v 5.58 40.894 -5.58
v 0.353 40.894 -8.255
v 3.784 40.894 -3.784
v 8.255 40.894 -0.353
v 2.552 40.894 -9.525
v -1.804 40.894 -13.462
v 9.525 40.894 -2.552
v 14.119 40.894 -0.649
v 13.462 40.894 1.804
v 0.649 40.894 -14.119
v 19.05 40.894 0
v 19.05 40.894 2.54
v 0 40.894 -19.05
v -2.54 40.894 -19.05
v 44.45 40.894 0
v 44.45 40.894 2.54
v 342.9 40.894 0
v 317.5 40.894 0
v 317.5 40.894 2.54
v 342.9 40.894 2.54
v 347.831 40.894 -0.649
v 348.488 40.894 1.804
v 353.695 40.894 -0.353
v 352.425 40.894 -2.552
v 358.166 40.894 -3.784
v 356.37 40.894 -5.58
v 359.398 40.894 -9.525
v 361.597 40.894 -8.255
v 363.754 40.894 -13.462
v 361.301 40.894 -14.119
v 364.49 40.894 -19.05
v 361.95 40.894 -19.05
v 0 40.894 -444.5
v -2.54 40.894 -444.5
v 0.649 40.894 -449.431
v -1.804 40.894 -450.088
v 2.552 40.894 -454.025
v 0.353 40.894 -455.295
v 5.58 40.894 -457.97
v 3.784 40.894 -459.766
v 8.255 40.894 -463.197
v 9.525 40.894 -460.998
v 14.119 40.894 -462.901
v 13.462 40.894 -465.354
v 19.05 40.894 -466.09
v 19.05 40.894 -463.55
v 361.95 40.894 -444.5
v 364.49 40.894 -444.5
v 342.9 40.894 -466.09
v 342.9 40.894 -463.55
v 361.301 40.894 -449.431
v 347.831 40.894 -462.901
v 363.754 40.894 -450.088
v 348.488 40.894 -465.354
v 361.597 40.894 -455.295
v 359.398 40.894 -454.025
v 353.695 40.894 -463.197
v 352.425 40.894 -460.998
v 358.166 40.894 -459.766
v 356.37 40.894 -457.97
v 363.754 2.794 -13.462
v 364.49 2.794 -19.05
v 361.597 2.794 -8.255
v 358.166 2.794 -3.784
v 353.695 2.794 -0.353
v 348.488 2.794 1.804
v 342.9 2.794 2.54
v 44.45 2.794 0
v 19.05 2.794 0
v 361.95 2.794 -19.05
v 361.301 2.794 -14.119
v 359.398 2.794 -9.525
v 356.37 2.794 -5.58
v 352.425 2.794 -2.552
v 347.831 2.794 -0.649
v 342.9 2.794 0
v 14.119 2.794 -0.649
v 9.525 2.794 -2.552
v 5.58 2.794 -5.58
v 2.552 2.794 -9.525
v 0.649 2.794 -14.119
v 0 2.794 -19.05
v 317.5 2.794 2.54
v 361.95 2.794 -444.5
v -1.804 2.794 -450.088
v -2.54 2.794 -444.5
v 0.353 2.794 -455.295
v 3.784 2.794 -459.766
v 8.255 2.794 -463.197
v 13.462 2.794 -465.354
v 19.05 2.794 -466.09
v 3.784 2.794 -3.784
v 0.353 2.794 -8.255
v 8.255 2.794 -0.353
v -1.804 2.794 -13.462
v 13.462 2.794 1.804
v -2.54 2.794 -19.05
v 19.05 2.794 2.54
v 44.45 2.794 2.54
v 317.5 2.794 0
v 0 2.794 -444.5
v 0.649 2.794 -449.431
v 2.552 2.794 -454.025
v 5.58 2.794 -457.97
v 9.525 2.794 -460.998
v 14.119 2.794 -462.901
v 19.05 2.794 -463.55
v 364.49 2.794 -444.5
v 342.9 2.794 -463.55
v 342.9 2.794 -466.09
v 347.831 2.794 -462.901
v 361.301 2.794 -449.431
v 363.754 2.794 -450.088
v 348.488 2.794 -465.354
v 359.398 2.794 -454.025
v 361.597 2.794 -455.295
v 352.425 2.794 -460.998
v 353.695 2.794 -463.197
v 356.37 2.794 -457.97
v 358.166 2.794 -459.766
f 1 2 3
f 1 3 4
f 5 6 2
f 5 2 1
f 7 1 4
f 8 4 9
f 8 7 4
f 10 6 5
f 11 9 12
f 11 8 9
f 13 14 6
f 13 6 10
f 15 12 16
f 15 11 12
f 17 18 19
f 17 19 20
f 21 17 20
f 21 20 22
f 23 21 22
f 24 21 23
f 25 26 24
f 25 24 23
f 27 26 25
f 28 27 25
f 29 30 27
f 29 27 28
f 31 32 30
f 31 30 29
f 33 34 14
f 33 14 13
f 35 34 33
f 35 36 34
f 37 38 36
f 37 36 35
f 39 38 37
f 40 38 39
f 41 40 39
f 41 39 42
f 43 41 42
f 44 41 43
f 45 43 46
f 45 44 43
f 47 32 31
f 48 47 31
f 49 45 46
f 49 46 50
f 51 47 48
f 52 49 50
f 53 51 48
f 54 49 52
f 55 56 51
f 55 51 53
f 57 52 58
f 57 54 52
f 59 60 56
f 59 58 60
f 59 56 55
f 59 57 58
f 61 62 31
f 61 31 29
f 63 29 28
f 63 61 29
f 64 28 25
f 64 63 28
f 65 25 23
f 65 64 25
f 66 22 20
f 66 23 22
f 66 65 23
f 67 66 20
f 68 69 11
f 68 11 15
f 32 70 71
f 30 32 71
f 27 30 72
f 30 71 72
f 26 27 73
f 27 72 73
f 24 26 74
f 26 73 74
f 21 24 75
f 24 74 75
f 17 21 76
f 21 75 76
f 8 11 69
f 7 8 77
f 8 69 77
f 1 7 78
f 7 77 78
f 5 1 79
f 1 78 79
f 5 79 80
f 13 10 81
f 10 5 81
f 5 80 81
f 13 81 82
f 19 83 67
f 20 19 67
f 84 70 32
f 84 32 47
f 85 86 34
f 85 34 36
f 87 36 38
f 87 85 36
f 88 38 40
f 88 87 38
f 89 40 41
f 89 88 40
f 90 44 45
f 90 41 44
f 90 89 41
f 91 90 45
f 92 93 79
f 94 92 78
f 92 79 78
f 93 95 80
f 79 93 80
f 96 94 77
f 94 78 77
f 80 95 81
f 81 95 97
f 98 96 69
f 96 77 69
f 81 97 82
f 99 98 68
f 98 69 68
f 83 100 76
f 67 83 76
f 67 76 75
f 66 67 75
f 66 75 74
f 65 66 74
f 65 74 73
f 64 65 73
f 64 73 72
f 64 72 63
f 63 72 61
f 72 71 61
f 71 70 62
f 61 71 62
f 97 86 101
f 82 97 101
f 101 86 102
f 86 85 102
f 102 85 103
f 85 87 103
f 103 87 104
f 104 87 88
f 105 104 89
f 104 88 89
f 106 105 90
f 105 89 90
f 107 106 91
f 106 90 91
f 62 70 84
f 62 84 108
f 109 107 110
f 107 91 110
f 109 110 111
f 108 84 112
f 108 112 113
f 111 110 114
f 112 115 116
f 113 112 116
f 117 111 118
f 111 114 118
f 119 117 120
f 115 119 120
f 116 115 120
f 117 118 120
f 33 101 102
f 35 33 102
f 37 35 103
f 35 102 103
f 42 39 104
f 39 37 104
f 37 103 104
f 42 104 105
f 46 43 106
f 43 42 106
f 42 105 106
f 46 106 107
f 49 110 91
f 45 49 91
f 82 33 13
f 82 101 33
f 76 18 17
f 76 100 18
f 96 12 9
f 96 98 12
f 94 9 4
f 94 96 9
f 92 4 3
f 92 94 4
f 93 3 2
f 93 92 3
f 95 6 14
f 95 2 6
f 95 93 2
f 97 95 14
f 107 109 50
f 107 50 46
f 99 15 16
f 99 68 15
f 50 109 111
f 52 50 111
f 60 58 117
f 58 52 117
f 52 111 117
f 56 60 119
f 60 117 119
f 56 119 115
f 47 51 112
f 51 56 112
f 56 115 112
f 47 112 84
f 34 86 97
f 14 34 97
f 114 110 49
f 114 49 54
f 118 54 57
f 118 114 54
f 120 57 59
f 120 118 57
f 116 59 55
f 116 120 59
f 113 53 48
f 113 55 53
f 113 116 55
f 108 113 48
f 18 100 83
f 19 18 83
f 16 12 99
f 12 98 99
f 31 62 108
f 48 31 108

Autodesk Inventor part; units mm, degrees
ref_plane "YZ Plane" through (0, 0, 0) normal (1, 0, 0) x (0, 1, 0)
ref_plane "XZ Plane" through (0, 0, 0) normal (0, 1, 0) x (-1, 0, 0)
ref_plane "XY Plane" through (0, 0, 0) normal (0, 0, 1) x (1, 0, 0)
sketch "Sketch1" plane through (0, 0, 0) normal (0, 1, 0) x (-1, 0, 0)
  line L0 (0, 0) -> (-361.95, 0)
  line L1 (-361.95, 0) -> (-361.95, -463.55)
  line L2 (-361.95, -463.55) -> (0, -463.55)
  line L3 (0, -463.55) -> (0, 0)
  dimension "d0" = 361.95
  dimension "d1" = 463.55
extrude "Extrusion1" add sketch "Sketch1" along normal blind 2.794
fillet "Fillet1" radius 19.05 4 edges at (361.95, 1.397, 0) (361.95, 1.397, -463.55) (0, 1.397, -463.55) (0, 1.397, 0)
sketch "Sketch2" plane through (0, 0, 0) normal (0, -1, 0) x (1, 0, 0)
  line L0 (19.05, 0) -> (342.9, 0)
  line L1 (342.9, 0) -> (342.9, -2.8525)
  line L2 (342.9, -2.8525) -> (19.05, -2.8525)
  line L3 (19.05, -2.8525) -> (19.05, 0)
  line L4 (342.9, -2.8525) -> (317.5, -2.8525)
  line L5 (317.5, -2.8525) -> (317.5, 0)
  line L6 (317.5, 0) -> (342.9, 0)
  line L7 (342.9, 0) -> (342.9, -2.8525)
  line L8 (19.05, -2.8525) -> (44.45, -2.8525)
  line L9 (44.45, -2.8525) -> (44.45, 0)
  line L10 (44.45, 0) -> (19.05, 0)
  line L11 (19.05, 0) -> (19.05, -2.8525)
  line L12 (44.45, -2.8525) -> (317.5, -2.8525)
  line L13 (317.5, -2.8525) -> (317.5, 0)
  line L14 (317.5, 0) -> (44.45, 0)
  line L15 (44.45, 0) -> (44.45, -2.8525)
  point P0 (0, 0)
  dimension "d5" = 25.4
  dimension "d6" = 25.4
extrude "Extrusion2" add sketch "Sketch2" along normal blind 25.4 contours L0 L5 L2 L9
sketch "Sketch3" plane through (19.05, 2.794, 0) normal (0, 0, 1) x (1, 0, 0)
  line L0 (323.85, -2.794) -> (0, -2.794) projected
  line L1 (25.405, -2.794) -> (25.4, -15.494)
  line L2 (25.4, -2.794) -> (25.4, -28.194) projected
  line L3 (25.4, -15.494) -> (85.4, -15.5178)
  line L4 (298.45, -2.794) -> (298.45, -28.194) projected
  line L5 (298.45, -15.494) -> (238.45, -15.494)
  circle A0 centre (85.4, -15.5178) radius 3.429
  circle A1 centre (238.45, -15.494) radius 3.429
  point P0 (-19.05, -2.794)
  dimension "d9" = 12.7
  dimension "d10" = 60
  dimension "d11" = 60
  dimension "d12" = 6.858
  dimension "d13" = 6.858
extrude "Extrusion3" cut sketch "Sketch3" against normal blind 25.4 contours A0 | A1
sketch "Sketch4" plane through (0, 2.794, 0) normal (0, 1, 0) x (1, 0, 0)
  arc A0 (0, 19.05) -> (19.05, 0) centre (19.05, 19.05) ccw projected
  line L0 (19.05, 0) -> (342.9, 0) projected
  arc A1 (342.9, 0) -> (361.95, 19.05) centre (342.9, 19.05) ccw projected
  line L1 (361.95, 19.05) -> (361.95, 444.5) projected
  arc A2 (361.95, 444.5) -> (342.9, 463.55) centre (342.9, 444.5) ccw projected
  line L2 (342.9, 463.55) -> (19.05, 463.55) projected
  arc A3 (19.05, 463.55) -> (0, 444.5) centre (19.05, 444.5) ccw projected
  line L3 (0, 444.5) -> (0, 19.05) projected
  arc A4 (-2.54, 19.05) -> (19.05, -2.54) centre (19.05, 19.05) ccw
  line L4 (19.05, -2.54) -> (342.9, -2.54)
  arc A5 (342.9, -2.54) -> (364.49, 19.05) centre (342.9, 19.05) ccw
  line L5 (364.49, 19.05) -> (364.49, 444.5)
  arc A6 (364.49, 444.5) -> (342.9, 466.09) centre (342.9, 444.5) ccw
  line L6 (342.9, 466.09) -> (19.05, 466.09)
  arc A7 (19.05, 466.09) -> (-2.54, 444.5) centre (19.05, 444.5) ccw
  line L7 (-2.54, 444.5) -> (-2.54, 19.05)
  line L8 (44.45, 0) -> (44.45, -2.54)
  line L9 (317.5, 0) -> (317.5, -2.54)
  point P0 (0, 0)
  dimension "d16" = 2.54
extrude "Extrusion4" add sketch "Sketch4" along normal blind 38.1 contours A0 L0 L8 L4 A4 L7 A7 L6 A6 L5 A5 L9 A1 L1 A2 L2 A3 L3
sketch "Sketch5" plane through (0, 2.794, 0) normal (0, 1, 0) x (1, 0, 0)
  arc A0 (0, 19.05) -> (19.05, 0) centre (19.05, 19.05) ccw projected
  line L0 (19.05, 0) -> (44.45, 0) projected
  line L1 (44.45, 0) -> (317.5, 0) projected
  line L2 (317.5, 0) -> (342.9, 0) projected
  arc A1 (342.9, 0) -> (361.95, 19.05) centre (342.9, 19.05) ccw projected
  line L3 (361.95, 19.05) -> (361.95, 444.5) projected
  arc A2 (361.95, 444.5) -> (342.9, 463.55) centre (342.9, 444.5) ccw projected
  line L4 (342.9, 463.55) -> (19.05, 463.55) projected
  arc A3 (19.05, 463.55) -> (0, 444.5) centre (19.05, 444.5) ccw projected
  line L5 (0, 444.5) -> (0, 19.05) projected
  point P0 (0, 0)
extrude "Extrusion5" cut sketch "Sketch5" against normal blind 38.1
properties part number "Cart_TOP_SHELF-LIP" material "Cart Material"
